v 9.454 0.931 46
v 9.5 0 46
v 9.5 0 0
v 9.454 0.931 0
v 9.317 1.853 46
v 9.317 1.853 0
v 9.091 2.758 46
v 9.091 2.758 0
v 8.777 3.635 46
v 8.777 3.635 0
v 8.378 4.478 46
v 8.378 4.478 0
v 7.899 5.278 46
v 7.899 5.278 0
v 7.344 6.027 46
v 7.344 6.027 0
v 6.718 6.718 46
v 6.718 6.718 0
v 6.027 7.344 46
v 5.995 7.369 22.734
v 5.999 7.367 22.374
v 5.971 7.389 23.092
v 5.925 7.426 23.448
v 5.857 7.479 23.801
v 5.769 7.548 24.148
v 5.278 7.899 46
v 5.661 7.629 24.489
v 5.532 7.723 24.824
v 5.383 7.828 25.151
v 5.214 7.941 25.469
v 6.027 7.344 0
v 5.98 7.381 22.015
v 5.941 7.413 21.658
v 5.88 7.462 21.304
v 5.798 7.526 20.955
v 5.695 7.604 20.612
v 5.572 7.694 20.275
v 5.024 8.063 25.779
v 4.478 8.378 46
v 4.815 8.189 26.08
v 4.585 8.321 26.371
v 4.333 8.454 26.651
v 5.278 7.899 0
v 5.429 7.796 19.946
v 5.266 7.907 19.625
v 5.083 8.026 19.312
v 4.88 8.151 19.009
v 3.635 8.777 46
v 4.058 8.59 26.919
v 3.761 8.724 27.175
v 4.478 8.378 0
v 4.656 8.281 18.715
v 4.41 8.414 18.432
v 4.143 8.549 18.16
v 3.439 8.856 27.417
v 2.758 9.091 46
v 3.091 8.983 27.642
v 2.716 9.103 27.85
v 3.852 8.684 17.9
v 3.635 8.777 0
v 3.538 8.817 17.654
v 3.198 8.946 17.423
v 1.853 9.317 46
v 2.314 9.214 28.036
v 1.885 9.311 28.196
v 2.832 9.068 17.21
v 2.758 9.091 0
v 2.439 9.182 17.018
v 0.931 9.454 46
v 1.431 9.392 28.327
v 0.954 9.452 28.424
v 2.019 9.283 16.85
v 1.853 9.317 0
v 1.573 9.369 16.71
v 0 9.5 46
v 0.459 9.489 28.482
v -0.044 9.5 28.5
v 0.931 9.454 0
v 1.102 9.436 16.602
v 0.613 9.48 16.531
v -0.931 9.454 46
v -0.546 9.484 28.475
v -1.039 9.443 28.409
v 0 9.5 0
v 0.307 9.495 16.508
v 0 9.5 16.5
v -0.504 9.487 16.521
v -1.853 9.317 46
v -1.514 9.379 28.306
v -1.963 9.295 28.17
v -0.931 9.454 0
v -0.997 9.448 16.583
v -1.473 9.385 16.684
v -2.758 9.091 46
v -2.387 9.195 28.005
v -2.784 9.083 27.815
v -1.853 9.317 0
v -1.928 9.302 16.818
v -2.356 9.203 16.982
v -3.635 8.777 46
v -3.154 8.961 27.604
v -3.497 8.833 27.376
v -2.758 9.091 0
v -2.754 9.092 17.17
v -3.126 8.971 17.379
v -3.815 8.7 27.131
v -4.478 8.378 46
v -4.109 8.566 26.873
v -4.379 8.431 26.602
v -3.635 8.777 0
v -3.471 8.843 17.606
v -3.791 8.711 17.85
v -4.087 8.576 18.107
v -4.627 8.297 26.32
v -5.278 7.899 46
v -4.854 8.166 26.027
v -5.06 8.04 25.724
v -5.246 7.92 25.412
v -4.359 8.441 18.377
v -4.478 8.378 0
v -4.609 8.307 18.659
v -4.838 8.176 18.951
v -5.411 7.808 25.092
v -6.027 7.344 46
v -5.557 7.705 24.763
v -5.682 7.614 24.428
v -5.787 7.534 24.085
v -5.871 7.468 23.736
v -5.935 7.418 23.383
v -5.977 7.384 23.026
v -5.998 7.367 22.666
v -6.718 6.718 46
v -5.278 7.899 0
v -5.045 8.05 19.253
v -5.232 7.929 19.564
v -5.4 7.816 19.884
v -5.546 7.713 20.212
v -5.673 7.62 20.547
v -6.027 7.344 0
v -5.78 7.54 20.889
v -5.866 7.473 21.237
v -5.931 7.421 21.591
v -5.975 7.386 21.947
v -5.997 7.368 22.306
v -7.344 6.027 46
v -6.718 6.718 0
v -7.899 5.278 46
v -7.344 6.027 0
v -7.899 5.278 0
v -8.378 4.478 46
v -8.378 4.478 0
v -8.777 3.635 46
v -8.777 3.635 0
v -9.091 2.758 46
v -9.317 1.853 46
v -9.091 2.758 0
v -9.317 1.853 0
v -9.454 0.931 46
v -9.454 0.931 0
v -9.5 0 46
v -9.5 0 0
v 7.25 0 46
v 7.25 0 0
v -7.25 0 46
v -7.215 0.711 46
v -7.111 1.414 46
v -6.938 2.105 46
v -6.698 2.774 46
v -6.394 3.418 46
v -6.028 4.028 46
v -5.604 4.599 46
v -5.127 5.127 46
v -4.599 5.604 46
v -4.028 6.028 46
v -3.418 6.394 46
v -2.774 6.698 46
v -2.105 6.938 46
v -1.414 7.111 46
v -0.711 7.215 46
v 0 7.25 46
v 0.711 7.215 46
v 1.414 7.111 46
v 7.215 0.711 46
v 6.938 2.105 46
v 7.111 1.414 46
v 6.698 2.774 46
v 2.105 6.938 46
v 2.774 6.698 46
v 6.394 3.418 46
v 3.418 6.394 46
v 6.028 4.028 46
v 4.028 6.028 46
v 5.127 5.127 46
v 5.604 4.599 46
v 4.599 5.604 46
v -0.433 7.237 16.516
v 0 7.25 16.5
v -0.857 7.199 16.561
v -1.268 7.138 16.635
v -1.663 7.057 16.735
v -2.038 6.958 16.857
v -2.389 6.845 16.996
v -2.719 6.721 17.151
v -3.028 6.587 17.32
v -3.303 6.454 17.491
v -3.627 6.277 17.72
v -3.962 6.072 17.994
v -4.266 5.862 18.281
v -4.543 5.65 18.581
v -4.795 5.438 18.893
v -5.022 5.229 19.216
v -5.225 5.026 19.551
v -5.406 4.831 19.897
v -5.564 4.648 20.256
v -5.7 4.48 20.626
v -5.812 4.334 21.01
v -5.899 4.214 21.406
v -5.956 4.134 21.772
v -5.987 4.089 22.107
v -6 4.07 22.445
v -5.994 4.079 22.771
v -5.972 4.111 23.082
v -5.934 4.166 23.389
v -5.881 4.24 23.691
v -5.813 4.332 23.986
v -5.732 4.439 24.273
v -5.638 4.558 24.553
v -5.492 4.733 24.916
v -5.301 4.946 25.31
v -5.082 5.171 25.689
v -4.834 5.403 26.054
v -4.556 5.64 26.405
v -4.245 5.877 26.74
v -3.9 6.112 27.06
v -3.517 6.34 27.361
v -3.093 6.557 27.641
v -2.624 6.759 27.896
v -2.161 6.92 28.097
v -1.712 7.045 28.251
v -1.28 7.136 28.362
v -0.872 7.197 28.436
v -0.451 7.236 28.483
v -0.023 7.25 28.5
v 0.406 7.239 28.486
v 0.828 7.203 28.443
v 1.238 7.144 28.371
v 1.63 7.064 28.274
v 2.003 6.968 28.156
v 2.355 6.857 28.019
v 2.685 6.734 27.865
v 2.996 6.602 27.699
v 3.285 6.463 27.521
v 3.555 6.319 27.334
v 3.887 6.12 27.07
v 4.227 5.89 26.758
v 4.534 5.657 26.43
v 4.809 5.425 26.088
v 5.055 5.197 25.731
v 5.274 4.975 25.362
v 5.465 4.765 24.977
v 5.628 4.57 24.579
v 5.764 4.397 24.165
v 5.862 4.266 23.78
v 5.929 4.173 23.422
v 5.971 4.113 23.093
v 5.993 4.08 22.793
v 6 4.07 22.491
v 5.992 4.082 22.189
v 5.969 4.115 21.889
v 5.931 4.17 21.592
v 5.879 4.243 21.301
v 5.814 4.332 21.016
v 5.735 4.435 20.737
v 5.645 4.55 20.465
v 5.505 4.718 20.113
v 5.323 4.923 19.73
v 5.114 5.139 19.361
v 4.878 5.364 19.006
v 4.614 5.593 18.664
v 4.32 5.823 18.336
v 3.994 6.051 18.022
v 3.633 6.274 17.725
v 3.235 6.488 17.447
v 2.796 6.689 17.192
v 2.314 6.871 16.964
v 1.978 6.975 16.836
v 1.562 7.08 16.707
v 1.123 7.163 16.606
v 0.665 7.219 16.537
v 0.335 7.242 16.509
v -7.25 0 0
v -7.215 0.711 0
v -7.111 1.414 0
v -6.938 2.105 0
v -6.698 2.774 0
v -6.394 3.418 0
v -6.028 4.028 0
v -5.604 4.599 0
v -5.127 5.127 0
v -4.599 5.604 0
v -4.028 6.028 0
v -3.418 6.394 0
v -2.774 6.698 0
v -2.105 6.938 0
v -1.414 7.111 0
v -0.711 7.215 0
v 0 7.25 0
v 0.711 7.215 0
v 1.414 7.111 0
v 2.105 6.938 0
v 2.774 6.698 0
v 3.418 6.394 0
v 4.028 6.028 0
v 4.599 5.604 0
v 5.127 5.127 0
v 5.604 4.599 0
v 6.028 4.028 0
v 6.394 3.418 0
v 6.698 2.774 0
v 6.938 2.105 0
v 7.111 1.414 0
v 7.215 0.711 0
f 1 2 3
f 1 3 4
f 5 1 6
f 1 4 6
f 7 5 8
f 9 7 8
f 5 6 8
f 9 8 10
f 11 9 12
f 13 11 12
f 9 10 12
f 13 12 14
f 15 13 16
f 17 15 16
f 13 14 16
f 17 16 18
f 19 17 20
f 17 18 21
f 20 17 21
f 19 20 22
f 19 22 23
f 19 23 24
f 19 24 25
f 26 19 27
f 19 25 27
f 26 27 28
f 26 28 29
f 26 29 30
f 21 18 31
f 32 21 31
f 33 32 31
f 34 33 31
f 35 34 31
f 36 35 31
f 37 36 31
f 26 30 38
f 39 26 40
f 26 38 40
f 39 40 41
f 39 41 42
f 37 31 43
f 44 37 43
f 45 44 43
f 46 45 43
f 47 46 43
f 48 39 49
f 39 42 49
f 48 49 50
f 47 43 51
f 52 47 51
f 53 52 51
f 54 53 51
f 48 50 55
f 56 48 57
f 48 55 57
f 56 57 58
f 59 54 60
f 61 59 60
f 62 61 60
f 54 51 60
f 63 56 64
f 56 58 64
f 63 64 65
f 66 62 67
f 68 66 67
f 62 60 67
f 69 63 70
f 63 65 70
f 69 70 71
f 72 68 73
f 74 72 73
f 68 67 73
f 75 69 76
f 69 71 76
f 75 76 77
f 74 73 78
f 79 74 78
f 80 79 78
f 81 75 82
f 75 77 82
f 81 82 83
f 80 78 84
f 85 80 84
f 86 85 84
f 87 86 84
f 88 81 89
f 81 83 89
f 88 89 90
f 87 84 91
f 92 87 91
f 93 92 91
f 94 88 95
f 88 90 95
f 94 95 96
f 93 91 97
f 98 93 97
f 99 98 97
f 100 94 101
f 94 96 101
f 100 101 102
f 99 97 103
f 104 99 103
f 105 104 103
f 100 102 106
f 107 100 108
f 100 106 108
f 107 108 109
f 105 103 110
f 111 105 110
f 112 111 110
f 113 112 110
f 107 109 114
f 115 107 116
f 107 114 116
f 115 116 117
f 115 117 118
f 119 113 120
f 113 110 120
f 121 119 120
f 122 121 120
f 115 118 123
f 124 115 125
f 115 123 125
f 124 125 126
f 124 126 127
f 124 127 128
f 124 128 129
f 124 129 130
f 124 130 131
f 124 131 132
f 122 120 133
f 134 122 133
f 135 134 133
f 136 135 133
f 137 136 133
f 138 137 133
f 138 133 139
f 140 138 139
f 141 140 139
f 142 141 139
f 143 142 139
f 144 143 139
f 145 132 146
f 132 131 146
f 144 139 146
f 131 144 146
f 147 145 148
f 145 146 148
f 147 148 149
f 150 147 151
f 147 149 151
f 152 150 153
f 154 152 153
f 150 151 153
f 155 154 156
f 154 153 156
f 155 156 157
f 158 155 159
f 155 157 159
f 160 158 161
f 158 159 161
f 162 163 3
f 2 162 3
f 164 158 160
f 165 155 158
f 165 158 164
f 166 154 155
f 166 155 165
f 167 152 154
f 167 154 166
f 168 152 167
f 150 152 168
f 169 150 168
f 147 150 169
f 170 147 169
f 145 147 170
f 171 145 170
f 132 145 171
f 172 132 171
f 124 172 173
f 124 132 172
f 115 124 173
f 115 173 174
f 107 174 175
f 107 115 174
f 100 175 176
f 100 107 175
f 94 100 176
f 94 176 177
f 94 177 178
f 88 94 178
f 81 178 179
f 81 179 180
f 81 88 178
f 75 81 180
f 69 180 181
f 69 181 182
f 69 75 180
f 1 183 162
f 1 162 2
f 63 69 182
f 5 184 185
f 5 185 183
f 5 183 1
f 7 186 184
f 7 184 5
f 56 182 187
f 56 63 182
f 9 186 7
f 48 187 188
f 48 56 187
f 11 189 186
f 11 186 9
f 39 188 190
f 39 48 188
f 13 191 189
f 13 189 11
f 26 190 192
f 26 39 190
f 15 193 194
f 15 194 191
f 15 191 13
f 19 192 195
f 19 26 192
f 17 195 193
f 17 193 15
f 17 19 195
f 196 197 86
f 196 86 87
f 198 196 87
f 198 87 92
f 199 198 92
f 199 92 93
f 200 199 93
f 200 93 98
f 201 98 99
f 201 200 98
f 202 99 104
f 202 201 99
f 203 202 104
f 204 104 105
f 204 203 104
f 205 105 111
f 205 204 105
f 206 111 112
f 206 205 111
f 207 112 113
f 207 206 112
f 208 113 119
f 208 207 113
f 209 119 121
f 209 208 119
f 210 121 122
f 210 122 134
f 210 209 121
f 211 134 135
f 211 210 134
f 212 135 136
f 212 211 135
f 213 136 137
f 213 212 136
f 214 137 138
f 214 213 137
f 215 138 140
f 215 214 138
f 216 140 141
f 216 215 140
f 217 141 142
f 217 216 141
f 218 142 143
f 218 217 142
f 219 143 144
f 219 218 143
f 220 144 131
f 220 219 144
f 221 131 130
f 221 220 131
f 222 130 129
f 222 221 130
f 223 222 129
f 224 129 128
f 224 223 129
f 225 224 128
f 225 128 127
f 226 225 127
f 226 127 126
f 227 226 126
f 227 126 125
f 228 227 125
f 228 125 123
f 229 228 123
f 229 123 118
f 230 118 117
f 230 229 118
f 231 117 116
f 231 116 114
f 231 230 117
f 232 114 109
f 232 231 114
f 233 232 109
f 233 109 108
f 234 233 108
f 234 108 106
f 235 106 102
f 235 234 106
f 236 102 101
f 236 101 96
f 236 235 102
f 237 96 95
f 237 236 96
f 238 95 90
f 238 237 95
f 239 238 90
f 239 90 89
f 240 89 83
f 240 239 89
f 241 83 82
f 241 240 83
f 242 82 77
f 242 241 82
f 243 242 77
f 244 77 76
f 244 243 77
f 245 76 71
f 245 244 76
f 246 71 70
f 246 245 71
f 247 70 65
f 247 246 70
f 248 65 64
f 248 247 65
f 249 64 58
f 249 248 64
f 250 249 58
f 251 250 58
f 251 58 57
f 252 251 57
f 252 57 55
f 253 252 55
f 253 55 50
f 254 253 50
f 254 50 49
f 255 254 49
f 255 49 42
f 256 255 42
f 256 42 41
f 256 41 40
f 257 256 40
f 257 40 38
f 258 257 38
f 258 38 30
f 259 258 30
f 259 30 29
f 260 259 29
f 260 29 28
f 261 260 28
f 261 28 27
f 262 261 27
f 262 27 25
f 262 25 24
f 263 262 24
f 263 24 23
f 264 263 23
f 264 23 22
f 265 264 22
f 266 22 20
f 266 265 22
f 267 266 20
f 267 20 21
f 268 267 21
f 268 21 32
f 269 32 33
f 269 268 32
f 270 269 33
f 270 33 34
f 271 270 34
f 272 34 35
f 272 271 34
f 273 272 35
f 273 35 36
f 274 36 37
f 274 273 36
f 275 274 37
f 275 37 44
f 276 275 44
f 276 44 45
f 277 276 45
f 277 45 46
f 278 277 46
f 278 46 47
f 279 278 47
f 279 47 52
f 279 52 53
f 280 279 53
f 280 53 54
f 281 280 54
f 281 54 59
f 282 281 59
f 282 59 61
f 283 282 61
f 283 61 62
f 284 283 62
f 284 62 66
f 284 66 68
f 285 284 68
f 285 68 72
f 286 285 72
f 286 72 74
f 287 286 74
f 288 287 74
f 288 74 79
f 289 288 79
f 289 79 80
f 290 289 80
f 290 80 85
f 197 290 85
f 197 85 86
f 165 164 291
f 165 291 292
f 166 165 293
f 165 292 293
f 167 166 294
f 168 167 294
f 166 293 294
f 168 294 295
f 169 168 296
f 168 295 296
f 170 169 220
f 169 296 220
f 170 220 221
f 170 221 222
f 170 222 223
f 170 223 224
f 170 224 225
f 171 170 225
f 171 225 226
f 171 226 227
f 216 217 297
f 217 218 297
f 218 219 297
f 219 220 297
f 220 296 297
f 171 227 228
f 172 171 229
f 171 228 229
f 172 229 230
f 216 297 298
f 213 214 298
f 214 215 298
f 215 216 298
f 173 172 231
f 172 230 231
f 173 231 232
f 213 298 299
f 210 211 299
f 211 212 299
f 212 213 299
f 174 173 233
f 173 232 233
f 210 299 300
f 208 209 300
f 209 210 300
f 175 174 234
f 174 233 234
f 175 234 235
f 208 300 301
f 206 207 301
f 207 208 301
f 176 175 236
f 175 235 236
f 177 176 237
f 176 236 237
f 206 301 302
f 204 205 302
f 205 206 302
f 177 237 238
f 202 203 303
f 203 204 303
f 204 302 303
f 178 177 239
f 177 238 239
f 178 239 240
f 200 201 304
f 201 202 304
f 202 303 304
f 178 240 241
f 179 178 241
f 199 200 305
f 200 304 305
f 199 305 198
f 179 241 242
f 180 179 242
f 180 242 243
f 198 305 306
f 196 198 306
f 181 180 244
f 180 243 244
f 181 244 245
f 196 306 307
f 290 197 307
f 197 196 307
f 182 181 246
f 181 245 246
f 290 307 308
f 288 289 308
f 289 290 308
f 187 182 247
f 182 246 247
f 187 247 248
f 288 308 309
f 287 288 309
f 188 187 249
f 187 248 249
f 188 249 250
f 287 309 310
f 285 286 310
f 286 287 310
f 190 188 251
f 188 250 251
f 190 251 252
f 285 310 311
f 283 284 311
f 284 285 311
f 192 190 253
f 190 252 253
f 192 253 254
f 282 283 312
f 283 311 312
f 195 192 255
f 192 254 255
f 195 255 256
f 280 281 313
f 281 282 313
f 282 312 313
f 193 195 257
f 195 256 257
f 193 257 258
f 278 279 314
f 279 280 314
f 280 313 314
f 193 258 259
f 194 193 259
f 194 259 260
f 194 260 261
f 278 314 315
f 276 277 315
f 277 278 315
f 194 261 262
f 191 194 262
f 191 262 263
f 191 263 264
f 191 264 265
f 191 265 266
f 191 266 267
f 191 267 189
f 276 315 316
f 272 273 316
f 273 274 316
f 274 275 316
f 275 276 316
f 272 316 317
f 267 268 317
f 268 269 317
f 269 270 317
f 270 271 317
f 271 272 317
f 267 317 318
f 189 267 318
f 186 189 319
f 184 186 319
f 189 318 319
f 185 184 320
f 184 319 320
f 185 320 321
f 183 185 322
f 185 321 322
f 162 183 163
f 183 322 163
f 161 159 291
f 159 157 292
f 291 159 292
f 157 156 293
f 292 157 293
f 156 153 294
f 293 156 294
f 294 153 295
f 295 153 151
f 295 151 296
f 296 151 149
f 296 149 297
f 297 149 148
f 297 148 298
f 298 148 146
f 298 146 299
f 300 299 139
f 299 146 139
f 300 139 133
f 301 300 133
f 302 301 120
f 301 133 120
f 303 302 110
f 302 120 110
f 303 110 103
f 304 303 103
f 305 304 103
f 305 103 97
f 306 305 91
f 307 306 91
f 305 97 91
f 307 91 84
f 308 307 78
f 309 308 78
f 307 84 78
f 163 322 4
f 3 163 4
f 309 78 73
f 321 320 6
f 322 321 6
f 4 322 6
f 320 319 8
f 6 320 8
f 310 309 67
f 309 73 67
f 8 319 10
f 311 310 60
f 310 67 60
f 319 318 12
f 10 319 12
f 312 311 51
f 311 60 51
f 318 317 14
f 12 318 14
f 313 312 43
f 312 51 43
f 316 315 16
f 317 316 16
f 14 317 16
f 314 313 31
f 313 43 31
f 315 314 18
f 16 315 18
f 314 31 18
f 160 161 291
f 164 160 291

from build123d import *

# Parameters (mm, degrees)
EXTRUDE_1_DEPTH     = 46
SKETCH_2_R          = 6
CUT_EXTRUDE_1_DEPTH = 45


with BuildPart() as part:
    # ｽｹｯﾁ1 → ﾎﾞｽ - 押し出し1 (new body)
    with BuildSketch(Plane.XY):
        with BuildLine():
            Line((-9.5, 0), (-7.25, 0))
            ThreePointArc((-7.25, 0), (0, 7.25), (7.25, 0))
            Line((7.25, 0), (9.5, 0))
            ThreePointArc((9.5, 0), (0, 9.5), (-9.5, 0))
        make_face()
    extrude(amount=EXTRUDE_1_DEPTH)

    # ｽｹｯﾁ2 → ｶｯﾄ - 押し出し1 (cut)
    with BuildSketch(Plane(origin=(0, 0, 0), x_dir=(1, 0, 0), z_dir=(0, 1, 0))):
        with Locations(Location((0, -22.5, 0), (0, 0, 90))):
            Circle(SKETCH_2_R)
    extrude(amount=CUT_EXTRUDE_1_DEPTH, mode=Mode.SUBTRACT)


solid = part.part
